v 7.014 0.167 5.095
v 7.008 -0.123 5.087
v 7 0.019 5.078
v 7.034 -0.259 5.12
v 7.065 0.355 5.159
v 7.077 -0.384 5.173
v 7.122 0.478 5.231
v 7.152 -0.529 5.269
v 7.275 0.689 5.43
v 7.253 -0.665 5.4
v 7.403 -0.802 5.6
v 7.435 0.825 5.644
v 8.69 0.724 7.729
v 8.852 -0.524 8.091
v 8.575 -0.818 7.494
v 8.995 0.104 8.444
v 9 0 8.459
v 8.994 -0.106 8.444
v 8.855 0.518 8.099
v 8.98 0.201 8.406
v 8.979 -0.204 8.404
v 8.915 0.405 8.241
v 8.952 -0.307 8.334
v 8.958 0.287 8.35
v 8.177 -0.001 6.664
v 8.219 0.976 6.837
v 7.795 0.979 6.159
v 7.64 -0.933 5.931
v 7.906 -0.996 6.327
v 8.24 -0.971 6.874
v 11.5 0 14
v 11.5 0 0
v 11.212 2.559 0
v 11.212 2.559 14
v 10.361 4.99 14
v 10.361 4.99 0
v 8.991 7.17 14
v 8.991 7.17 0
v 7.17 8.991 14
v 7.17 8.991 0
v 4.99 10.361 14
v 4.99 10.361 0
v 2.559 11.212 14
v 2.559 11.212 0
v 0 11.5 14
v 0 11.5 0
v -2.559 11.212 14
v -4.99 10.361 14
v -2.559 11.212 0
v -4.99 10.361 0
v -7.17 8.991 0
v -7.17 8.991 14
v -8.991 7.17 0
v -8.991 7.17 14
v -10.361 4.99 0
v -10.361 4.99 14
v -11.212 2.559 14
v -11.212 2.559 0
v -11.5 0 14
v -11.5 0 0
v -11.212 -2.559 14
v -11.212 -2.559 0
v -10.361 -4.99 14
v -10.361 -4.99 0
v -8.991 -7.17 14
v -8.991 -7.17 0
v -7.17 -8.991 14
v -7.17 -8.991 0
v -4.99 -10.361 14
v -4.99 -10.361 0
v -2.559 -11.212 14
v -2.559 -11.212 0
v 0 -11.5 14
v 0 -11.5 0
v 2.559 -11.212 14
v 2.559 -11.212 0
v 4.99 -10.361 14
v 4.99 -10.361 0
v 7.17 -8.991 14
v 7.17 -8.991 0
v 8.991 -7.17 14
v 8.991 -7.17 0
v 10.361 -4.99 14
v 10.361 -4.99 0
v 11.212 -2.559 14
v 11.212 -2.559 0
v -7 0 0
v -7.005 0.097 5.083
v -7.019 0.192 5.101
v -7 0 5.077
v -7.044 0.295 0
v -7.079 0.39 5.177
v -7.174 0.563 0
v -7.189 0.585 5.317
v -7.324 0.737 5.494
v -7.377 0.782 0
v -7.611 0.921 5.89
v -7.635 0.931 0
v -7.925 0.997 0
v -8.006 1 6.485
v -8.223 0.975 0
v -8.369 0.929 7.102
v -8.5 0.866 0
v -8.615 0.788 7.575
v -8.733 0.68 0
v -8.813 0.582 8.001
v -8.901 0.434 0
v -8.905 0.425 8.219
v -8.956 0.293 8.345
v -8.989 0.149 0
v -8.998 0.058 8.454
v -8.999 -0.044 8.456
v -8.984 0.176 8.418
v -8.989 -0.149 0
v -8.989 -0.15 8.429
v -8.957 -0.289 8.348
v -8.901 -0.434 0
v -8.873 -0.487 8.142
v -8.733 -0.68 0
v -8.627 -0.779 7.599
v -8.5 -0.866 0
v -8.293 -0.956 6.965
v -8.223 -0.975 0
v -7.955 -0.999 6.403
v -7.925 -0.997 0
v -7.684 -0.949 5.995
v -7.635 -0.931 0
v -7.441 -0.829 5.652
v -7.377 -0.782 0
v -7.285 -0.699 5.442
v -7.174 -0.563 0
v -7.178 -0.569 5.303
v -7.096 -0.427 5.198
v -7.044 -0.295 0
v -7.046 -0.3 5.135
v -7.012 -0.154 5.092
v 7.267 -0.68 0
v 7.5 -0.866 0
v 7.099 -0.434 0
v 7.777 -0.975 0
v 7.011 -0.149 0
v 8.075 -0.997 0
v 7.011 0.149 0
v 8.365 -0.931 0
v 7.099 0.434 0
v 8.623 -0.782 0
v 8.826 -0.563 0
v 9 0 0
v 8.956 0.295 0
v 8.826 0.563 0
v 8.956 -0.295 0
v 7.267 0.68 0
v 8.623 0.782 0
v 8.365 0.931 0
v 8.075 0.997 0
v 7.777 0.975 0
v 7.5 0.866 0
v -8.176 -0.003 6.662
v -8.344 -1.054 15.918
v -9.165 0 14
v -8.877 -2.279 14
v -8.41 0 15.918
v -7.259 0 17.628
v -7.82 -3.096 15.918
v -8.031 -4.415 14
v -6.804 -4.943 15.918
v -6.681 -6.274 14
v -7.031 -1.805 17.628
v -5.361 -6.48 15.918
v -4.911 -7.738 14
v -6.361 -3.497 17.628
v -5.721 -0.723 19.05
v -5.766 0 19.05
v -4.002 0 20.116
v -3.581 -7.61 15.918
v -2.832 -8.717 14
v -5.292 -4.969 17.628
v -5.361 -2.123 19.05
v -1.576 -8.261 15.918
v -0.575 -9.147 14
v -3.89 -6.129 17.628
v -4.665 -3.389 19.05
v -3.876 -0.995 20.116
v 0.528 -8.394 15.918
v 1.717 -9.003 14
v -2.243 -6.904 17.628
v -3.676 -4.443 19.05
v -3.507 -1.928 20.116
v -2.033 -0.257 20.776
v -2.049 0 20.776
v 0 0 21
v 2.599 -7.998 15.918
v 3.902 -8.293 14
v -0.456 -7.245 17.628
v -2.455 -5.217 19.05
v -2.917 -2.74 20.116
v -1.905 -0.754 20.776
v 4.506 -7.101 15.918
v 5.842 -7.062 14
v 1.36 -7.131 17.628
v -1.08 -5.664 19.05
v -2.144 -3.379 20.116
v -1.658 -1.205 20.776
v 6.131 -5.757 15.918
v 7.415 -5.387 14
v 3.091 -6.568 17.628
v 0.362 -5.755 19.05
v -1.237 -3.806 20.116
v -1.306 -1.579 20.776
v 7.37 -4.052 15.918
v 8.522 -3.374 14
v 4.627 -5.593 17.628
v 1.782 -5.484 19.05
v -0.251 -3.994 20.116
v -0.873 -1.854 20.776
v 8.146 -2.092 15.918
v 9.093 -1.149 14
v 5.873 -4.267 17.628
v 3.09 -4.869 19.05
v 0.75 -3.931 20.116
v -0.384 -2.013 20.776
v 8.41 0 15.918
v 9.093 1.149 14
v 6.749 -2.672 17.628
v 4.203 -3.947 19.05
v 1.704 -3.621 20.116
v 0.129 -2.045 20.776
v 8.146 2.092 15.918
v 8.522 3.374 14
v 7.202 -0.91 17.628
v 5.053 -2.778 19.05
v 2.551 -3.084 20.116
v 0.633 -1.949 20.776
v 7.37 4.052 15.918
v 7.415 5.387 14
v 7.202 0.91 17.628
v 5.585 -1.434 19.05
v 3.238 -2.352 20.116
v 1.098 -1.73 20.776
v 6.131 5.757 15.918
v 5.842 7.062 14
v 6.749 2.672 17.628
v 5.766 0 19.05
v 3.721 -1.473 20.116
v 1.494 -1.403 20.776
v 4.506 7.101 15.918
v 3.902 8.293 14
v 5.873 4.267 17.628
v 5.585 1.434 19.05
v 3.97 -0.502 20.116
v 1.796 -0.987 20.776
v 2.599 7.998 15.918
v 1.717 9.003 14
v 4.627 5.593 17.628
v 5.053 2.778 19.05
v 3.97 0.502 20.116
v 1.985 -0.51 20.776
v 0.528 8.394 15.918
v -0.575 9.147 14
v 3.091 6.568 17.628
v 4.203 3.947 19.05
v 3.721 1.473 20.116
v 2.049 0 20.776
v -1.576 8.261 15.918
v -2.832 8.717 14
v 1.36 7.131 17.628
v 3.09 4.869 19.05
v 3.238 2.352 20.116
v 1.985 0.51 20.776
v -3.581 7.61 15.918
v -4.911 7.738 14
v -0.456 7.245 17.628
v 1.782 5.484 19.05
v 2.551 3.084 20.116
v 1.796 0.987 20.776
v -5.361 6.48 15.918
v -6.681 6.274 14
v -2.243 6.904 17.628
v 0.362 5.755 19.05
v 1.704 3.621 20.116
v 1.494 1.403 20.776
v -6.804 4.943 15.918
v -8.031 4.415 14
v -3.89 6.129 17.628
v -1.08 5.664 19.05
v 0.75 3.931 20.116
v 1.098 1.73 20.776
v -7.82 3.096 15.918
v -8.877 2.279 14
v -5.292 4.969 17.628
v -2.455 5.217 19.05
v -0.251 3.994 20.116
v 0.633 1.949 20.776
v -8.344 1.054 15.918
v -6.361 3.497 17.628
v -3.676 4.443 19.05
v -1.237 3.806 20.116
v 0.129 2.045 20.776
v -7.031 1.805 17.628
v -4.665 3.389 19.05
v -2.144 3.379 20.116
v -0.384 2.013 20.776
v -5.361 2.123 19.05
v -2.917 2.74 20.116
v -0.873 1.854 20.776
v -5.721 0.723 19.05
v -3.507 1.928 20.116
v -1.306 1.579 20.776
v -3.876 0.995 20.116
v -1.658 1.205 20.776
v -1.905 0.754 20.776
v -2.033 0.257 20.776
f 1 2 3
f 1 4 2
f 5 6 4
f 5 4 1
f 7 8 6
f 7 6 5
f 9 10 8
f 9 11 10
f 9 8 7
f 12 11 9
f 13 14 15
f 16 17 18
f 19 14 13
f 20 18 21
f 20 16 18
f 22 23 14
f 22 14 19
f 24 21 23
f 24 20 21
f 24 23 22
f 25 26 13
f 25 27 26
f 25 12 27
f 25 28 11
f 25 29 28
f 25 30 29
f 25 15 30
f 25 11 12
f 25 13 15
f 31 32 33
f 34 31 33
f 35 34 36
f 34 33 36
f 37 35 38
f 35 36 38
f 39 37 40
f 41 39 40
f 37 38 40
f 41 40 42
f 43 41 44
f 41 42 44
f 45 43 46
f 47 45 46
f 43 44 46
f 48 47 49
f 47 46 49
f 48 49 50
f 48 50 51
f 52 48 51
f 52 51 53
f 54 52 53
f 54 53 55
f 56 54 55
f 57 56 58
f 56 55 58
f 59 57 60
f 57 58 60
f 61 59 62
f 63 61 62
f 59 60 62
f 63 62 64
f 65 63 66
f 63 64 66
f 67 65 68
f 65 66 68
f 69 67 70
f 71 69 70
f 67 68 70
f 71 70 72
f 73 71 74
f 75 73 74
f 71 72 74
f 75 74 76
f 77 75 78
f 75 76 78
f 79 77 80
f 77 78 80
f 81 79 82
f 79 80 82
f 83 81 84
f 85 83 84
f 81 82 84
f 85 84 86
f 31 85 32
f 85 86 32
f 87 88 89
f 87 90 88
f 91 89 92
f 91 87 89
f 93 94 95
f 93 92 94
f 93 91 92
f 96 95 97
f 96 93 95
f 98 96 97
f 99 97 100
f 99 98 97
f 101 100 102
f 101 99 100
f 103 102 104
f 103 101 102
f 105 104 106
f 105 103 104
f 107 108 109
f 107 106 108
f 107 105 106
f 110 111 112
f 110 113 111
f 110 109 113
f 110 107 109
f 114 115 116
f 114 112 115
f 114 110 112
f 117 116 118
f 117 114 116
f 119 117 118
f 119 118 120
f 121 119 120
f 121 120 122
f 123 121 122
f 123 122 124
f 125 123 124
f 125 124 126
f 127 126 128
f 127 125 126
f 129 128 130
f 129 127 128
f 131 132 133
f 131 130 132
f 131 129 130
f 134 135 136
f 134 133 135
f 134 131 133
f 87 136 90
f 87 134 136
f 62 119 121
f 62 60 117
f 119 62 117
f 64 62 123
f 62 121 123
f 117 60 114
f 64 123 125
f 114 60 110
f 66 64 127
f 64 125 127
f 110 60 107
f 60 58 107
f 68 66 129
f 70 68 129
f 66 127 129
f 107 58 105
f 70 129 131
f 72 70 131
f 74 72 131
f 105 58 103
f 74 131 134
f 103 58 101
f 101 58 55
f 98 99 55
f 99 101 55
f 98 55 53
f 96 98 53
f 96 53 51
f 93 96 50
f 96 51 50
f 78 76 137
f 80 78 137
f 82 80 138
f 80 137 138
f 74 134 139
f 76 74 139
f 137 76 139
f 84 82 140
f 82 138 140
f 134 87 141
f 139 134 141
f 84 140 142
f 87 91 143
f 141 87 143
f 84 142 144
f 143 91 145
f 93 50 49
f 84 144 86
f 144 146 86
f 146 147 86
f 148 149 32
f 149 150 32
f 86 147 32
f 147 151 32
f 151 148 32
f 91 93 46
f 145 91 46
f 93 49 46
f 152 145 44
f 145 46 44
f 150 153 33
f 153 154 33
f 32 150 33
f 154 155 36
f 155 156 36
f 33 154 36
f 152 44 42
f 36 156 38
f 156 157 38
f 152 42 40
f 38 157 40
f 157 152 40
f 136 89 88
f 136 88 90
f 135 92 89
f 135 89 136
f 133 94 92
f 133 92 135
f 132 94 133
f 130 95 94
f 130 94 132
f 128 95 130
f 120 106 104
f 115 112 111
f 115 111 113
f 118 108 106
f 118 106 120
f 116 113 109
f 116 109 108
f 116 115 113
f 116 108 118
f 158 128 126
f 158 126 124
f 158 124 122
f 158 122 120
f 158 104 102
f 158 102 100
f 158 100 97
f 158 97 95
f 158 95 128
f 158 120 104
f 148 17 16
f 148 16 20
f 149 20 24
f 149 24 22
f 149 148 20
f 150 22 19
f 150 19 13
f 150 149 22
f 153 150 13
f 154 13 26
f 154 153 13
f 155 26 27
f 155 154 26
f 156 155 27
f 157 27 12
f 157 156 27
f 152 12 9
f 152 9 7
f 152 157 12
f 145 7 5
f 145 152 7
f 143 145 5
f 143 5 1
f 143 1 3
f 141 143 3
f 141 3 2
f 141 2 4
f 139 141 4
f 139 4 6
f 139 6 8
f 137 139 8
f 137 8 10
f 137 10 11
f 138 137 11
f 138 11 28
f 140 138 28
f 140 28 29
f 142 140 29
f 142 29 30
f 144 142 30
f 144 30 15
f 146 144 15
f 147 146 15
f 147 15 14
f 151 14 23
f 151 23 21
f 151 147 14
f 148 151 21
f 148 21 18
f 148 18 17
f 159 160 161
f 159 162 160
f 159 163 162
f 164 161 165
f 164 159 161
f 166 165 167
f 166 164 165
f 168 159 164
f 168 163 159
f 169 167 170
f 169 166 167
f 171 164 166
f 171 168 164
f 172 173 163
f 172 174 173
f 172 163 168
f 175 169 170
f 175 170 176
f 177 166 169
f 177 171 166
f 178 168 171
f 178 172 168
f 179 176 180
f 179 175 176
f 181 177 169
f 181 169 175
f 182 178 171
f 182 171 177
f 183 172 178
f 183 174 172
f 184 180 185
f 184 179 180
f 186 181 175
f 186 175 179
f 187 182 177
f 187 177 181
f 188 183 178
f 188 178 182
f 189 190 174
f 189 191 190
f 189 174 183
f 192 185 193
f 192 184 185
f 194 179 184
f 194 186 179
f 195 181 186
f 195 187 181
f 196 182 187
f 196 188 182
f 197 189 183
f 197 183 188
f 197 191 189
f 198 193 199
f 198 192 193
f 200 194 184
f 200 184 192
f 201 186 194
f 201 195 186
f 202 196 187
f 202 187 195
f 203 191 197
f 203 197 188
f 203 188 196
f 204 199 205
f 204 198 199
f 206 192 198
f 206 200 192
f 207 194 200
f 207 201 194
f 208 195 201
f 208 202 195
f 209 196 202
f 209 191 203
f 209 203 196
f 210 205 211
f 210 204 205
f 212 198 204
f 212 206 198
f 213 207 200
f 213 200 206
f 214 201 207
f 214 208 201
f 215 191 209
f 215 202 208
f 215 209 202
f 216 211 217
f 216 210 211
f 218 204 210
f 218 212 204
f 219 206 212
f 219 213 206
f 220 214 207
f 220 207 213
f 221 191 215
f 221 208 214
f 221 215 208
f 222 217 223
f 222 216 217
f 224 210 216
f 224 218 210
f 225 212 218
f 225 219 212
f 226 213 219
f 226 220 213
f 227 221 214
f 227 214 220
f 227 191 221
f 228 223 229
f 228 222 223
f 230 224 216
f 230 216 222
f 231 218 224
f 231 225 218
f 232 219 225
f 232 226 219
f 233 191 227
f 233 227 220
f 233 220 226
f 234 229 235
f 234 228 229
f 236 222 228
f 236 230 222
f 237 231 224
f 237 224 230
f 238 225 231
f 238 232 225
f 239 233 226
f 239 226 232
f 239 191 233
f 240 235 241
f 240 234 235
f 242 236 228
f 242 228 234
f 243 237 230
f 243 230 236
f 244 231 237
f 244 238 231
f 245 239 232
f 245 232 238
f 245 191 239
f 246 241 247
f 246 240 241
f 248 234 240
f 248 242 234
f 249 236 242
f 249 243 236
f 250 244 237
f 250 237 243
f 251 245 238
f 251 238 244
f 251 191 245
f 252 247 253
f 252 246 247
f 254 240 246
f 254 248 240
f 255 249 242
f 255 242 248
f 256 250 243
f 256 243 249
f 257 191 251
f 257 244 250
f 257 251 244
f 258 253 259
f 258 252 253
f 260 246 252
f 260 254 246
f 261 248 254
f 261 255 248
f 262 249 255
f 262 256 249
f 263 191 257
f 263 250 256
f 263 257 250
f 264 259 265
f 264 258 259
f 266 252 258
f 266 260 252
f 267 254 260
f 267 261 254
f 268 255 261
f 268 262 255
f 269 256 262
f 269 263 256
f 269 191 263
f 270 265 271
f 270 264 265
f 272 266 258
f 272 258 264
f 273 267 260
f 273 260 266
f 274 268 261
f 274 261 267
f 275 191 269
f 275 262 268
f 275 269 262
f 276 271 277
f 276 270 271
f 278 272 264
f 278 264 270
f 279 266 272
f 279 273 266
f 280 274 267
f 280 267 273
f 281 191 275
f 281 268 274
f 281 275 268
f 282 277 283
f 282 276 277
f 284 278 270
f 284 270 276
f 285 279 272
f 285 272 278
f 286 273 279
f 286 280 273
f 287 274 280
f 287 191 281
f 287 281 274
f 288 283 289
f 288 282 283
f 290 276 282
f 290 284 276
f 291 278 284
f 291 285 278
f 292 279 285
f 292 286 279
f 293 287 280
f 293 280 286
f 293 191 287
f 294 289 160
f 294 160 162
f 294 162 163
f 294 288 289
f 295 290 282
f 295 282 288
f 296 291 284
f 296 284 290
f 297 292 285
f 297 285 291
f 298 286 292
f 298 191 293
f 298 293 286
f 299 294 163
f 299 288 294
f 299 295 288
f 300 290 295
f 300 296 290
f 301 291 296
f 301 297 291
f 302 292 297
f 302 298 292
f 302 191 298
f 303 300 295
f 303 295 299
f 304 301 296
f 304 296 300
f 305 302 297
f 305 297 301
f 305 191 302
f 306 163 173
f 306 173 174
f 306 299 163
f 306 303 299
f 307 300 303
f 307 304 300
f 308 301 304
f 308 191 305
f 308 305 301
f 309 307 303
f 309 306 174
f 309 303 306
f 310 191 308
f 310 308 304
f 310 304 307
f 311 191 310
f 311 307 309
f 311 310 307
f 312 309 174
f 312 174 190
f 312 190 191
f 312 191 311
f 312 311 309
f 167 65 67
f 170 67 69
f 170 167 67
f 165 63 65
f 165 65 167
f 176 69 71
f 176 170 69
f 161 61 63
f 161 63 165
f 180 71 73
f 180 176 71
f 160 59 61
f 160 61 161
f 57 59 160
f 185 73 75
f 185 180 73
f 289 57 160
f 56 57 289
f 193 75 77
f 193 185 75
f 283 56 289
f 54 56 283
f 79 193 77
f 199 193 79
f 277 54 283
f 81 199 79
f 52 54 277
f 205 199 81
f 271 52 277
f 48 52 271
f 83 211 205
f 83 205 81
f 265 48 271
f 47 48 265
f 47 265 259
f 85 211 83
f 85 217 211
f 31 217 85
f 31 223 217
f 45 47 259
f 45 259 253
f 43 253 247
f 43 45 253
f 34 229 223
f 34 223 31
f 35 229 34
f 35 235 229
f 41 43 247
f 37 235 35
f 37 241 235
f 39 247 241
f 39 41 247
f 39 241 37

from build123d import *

# Parameters (mm, degrees)
SKIZZE1_R   = 11.5
SKIZZE1_R_2 = 1
BODY_DEPTH  = 14


with BuildPart() as part:
    # Skizze1 → Body (new body)
    with BuildSketch(Plane.XY):
        Circle(SKIZZE1_R)
        with Locations((-8, 0)):
            Circle(SKIZZE1_R_2, mode=Mode.SUBTRACT)
        with Locations((8, 0)):
            Circle(SKIZZE1_R_2, mode=Mode.SUBTRACT)
    extrude(amount=BODY_DEPTH)

    # Skizze2 → Rotation1 (revolve)
    with BuildSketch(Plane(origin=(0, 0, 0), x_dir=(1, 0, 0), z_dir=(0, 1, 0))):
        with BuildLine():
            ThreePointArc((0, -2), (-9.5, -11.5), (0, -21))
            Line((0, -21), (0, -2))
        make_face()
    revolve(axis=Axis((0, 0, 0), (0, 0, 1)))


solid = part.part
